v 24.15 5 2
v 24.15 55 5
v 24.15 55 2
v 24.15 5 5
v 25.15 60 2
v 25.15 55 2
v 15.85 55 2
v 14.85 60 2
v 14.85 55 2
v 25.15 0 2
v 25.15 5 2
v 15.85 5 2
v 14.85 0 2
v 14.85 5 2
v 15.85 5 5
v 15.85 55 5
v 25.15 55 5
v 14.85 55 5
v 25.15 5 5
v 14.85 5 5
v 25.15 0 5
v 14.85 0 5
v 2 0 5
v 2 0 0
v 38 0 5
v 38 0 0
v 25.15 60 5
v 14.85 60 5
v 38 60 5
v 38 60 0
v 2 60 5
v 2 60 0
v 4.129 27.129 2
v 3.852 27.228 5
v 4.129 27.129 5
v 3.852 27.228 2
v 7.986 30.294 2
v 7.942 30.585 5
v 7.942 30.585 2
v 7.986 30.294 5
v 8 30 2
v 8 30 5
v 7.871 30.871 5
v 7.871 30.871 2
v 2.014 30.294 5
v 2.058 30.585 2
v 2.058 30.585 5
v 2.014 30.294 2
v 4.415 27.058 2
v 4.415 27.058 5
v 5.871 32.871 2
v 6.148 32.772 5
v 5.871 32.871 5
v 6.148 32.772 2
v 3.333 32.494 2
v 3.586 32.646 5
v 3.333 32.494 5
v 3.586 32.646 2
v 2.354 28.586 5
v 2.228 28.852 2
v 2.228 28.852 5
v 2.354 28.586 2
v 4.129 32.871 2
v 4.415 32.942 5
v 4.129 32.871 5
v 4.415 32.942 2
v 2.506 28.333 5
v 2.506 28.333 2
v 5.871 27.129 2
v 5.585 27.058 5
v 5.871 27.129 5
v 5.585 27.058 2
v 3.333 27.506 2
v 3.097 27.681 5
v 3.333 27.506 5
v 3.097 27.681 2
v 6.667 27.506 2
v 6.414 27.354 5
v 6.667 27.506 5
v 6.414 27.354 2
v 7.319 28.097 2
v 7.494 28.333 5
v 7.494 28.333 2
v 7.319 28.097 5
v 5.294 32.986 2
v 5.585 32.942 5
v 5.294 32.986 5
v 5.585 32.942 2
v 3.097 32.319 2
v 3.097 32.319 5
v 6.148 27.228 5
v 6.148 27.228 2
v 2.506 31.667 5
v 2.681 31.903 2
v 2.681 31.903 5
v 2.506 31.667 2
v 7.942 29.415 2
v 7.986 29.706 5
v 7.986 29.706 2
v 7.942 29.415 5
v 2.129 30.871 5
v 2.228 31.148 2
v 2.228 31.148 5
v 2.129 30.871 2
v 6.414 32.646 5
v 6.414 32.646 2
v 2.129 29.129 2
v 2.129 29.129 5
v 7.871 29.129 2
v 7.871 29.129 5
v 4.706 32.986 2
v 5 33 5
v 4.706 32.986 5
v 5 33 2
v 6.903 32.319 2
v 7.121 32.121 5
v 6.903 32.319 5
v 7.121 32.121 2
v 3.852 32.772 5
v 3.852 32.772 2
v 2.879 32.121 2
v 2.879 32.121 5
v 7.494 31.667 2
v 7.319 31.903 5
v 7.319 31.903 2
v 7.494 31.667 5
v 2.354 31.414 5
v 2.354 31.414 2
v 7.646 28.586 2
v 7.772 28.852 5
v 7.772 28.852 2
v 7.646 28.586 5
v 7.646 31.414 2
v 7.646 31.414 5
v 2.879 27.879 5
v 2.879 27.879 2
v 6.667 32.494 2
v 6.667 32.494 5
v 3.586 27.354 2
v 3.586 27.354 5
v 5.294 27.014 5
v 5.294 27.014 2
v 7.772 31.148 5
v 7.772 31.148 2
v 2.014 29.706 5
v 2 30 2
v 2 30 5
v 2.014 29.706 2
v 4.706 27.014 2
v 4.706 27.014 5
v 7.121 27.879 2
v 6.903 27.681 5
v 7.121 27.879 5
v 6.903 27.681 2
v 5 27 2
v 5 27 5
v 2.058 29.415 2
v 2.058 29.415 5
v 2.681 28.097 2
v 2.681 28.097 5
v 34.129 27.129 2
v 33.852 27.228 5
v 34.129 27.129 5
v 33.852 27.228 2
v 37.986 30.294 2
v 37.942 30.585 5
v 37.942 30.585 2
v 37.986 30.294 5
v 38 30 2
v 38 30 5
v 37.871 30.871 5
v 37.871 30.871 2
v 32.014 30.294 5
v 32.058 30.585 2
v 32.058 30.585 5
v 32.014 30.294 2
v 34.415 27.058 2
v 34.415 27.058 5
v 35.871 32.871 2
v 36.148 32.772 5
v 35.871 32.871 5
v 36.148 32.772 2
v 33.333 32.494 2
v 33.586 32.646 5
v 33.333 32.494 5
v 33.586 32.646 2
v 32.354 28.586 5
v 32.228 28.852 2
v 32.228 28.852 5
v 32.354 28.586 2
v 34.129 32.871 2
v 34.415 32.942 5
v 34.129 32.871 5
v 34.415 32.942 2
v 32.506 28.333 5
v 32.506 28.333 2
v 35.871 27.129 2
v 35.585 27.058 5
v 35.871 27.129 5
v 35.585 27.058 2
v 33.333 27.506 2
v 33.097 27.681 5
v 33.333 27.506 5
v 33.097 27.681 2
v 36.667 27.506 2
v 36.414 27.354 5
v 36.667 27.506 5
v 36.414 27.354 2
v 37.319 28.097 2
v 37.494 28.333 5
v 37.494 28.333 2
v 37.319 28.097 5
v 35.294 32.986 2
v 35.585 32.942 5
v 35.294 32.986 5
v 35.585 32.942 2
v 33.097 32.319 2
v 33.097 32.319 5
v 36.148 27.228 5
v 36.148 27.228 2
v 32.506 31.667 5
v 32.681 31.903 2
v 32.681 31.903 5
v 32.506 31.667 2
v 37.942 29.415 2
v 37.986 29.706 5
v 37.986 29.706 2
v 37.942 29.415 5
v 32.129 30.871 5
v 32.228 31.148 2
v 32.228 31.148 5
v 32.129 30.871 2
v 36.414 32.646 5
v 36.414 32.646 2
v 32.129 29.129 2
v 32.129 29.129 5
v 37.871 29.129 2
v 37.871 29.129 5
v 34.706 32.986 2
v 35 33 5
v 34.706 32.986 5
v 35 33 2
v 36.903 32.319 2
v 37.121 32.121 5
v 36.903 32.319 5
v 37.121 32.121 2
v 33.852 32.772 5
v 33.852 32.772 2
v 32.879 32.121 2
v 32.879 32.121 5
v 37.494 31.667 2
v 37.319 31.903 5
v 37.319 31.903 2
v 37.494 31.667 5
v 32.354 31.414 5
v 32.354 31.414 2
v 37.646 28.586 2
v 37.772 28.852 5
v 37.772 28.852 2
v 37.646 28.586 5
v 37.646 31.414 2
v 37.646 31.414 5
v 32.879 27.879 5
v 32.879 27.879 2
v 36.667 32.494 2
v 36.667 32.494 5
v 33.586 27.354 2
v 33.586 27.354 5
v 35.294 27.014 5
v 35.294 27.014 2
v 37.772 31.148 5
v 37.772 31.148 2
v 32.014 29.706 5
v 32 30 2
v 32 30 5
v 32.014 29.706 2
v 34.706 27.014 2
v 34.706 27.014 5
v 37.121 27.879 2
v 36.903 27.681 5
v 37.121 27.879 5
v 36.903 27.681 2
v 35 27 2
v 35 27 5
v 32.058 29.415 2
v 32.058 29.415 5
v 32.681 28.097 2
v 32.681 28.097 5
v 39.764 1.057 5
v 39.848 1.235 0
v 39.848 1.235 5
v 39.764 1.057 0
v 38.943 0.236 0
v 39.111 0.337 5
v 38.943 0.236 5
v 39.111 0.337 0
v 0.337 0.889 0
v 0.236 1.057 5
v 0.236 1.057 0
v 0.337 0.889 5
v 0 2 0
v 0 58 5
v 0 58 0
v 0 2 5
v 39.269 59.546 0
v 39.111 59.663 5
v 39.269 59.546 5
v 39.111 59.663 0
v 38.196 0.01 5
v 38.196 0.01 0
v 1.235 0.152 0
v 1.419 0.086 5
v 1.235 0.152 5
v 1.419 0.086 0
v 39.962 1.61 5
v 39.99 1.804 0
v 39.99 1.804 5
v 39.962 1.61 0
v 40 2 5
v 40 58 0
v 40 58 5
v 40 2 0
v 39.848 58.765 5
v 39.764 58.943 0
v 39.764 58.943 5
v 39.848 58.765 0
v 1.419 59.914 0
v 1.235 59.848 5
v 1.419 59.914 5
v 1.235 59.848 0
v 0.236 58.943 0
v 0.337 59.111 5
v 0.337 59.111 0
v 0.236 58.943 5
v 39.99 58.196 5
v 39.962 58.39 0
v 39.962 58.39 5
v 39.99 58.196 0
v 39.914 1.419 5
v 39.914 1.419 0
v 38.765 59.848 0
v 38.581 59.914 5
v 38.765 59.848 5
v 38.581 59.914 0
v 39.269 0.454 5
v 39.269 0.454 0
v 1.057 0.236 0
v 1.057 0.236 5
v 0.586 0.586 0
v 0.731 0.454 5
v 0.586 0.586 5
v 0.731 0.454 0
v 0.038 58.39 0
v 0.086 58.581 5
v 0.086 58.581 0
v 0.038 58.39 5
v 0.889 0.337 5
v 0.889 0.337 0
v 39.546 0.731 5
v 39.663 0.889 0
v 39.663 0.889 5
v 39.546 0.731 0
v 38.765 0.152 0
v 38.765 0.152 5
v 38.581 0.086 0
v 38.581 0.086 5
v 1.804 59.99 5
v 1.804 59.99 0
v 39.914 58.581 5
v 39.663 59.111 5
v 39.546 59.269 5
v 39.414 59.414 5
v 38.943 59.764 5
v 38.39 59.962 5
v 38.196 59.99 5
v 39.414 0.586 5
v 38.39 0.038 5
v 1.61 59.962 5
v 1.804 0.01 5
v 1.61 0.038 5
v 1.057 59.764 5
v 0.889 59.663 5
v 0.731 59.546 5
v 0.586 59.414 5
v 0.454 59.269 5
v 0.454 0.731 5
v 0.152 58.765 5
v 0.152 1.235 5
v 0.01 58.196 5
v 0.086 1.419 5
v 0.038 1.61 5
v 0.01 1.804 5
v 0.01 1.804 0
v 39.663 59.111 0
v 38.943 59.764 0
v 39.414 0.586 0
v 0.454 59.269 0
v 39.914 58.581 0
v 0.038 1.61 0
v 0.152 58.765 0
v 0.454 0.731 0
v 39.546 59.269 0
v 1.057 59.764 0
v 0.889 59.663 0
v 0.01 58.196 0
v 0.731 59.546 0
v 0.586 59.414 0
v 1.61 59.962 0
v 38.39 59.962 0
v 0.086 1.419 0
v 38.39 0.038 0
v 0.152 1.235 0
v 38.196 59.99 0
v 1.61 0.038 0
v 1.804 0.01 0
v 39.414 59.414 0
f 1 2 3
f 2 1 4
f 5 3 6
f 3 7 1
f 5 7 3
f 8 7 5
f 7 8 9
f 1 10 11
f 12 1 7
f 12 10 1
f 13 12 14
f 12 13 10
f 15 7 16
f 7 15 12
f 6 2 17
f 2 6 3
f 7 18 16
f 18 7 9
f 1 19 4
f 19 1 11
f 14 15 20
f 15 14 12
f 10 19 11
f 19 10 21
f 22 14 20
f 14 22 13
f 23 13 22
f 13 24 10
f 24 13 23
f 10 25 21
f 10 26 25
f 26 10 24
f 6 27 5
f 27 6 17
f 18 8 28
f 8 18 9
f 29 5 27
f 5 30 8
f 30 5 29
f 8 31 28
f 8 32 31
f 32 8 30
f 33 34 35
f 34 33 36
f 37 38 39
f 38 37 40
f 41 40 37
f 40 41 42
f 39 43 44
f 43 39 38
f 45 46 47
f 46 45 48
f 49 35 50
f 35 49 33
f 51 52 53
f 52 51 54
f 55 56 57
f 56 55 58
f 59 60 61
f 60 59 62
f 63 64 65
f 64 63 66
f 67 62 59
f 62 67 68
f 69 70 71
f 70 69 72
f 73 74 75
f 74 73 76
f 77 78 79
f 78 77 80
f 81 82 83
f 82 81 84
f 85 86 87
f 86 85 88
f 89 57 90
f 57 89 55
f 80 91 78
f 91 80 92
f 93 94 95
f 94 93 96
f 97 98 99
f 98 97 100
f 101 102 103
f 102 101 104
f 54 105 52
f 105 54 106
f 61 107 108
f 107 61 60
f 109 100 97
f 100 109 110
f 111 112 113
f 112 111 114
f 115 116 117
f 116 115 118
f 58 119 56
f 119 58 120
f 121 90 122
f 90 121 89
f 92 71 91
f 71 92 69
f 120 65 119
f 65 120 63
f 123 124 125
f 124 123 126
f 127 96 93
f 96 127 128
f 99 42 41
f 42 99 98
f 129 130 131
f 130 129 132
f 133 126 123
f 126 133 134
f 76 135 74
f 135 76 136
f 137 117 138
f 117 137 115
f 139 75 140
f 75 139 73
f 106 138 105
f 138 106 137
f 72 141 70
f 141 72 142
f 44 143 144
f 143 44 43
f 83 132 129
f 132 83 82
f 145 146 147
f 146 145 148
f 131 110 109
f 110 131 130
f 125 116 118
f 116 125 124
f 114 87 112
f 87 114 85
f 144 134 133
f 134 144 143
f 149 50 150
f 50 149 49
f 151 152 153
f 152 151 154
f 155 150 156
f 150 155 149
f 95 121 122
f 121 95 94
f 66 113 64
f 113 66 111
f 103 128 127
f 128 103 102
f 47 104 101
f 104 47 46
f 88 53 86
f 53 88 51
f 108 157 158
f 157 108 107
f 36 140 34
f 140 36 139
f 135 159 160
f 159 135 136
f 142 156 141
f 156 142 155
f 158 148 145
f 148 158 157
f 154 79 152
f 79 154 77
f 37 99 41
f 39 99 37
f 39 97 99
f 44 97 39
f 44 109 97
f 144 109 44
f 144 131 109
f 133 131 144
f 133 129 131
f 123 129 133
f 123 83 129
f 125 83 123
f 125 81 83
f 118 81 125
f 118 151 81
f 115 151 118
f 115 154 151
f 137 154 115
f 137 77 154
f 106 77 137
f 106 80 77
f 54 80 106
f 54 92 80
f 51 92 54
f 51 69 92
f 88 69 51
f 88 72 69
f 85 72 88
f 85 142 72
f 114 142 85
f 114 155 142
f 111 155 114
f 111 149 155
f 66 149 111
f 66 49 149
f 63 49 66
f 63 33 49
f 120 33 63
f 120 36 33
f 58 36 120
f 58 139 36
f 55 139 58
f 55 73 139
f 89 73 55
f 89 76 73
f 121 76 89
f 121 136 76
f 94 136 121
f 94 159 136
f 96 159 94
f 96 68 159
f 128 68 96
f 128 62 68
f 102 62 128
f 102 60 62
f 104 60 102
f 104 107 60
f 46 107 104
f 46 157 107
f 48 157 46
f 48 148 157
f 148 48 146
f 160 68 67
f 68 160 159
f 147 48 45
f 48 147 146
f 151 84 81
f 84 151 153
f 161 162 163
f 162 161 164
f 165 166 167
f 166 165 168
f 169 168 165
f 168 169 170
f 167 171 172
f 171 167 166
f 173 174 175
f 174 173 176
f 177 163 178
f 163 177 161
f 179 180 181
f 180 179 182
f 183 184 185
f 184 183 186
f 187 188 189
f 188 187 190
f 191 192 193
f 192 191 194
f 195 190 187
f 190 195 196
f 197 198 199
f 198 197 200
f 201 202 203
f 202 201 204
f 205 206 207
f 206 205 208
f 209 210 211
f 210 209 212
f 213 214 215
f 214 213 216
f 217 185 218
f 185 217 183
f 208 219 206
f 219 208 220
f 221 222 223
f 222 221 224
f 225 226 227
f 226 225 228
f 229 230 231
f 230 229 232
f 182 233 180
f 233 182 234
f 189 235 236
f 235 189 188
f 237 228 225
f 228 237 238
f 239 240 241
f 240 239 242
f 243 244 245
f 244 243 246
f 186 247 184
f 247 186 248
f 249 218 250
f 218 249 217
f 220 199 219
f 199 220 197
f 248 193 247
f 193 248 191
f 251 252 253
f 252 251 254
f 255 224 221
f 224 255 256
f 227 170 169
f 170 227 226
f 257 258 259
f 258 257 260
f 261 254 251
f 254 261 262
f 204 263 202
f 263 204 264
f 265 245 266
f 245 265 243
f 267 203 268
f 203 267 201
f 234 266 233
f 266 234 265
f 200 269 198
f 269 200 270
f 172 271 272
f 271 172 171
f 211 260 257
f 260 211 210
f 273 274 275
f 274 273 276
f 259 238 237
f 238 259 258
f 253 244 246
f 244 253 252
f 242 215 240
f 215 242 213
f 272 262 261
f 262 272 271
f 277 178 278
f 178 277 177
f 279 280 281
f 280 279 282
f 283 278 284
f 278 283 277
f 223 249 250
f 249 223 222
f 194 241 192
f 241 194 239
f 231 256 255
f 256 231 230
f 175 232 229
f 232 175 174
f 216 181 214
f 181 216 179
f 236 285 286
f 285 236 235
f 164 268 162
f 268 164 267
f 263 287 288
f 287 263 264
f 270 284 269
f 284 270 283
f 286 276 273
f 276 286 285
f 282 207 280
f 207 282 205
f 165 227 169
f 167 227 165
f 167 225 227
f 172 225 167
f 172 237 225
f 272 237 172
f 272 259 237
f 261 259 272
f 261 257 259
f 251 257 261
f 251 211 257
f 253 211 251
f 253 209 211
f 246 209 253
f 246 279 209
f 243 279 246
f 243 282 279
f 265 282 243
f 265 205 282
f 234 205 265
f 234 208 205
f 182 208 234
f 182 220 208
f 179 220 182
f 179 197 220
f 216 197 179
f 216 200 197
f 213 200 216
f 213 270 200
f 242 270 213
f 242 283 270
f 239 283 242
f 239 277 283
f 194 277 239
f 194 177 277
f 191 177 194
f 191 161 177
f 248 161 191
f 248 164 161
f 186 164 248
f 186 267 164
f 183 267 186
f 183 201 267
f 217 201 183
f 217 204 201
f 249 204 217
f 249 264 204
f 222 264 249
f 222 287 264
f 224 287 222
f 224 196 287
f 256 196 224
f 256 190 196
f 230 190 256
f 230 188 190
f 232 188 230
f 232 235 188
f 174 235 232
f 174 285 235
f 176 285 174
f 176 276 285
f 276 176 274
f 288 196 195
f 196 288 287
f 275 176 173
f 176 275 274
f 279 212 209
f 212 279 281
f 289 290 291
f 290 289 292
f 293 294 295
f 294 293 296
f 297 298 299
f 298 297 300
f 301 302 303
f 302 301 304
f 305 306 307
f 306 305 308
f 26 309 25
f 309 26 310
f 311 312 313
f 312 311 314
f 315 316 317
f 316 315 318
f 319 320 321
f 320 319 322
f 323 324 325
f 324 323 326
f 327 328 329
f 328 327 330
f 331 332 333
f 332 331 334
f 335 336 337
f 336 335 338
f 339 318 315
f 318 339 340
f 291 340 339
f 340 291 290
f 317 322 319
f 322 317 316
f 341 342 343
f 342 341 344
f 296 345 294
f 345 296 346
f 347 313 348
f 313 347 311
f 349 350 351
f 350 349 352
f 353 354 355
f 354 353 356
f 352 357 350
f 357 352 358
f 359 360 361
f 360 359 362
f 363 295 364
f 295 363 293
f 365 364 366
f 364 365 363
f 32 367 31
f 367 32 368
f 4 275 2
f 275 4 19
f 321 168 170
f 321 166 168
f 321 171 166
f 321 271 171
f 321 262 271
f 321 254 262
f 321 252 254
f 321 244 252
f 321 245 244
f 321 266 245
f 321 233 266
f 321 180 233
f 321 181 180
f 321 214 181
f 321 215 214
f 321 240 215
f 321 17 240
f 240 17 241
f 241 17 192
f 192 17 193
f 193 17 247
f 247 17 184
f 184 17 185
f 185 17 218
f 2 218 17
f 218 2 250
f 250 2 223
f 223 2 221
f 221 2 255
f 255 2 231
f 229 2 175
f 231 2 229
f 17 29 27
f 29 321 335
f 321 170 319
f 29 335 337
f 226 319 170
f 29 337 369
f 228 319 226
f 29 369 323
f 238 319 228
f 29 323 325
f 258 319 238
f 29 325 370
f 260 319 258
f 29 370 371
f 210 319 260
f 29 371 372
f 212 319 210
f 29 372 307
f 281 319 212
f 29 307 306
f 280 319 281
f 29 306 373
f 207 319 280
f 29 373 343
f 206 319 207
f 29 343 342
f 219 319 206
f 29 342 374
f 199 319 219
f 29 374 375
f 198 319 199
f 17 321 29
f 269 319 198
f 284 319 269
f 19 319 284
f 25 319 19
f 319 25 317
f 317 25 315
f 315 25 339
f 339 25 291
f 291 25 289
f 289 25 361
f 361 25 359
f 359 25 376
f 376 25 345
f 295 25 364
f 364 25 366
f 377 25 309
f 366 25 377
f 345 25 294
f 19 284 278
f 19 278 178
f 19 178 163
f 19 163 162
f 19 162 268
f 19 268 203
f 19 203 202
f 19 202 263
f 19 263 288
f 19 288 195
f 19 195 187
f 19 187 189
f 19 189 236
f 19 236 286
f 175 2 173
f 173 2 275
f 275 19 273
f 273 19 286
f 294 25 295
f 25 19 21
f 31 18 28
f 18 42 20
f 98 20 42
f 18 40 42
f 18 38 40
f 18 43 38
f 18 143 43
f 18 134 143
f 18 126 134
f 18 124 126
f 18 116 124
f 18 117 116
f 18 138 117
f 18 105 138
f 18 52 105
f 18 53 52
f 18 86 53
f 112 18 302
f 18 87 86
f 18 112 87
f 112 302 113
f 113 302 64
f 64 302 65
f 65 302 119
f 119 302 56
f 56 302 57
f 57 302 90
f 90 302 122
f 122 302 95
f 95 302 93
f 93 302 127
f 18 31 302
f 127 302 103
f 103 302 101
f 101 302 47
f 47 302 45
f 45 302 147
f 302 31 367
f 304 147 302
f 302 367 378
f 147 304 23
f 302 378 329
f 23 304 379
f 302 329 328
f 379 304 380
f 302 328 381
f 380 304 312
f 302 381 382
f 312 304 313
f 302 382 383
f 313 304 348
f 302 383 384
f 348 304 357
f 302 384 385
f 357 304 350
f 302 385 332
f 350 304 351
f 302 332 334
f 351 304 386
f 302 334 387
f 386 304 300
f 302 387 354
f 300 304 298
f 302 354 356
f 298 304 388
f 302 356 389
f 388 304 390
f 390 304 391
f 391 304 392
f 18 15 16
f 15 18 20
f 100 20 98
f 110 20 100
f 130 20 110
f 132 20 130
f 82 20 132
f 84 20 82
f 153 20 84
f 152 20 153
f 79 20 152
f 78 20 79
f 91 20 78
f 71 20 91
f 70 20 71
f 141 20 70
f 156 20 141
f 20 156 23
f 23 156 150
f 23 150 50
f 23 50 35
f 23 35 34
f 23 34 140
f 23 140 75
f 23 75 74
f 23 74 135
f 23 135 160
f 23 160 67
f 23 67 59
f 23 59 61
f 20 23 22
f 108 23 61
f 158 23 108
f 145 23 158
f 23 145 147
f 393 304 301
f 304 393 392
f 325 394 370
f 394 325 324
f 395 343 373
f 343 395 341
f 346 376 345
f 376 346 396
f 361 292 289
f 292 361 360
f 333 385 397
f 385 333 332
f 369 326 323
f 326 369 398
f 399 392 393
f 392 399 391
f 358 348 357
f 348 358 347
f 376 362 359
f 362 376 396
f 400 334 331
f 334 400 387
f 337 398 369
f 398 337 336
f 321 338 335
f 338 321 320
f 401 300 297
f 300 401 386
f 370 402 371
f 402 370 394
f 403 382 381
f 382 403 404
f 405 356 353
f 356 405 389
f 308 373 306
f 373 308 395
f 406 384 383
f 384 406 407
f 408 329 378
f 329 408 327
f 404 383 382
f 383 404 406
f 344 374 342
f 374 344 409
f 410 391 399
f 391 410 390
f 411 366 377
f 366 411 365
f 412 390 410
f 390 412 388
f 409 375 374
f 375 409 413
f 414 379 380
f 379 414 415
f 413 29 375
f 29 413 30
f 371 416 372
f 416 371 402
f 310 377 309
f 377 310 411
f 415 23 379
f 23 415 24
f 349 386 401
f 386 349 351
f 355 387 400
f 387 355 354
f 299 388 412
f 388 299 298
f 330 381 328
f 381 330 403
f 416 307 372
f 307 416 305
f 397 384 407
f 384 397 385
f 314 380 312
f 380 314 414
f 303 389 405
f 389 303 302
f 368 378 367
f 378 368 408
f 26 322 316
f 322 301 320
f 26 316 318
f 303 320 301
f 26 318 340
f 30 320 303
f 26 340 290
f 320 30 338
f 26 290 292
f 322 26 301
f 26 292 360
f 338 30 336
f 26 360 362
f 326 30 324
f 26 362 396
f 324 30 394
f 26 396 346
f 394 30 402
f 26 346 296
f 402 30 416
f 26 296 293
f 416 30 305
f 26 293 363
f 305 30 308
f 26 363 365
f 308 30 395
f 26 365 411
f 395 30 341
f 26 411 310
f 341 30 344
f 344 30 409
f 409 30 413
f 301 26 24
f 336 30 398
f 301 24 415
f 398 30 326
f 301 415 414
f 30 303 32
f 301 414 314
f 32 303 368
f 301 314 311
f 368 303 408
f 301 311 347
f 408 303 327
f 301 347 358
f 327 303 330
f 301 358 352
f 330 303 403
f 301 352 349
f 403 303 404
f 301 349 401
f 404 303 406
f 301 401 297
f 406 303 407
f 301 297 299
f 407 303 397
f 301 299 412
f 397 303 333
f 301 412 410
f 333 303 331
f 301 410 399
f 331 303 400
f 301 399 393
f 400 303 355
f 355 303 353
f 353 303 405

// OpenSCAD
// file: ../src/strip_feeder_magnetic.scad
// Strip Feeder with Magnetic Holders for MicroSMT v3
// Based on the MicroSMT v3 magnetic slot design
// Supports 8mm, 12mm, 16mm, and 24mm tape widths

/* [Main Parameters] */
// Tape width in mm (8, 12, 16, or 24)
tape_width = 8; // [8:4:24]

// Number of feeder slots
num_slots = 1; // [1:1:10]

// Render mode
render_mode = "single"; // [single:Single Slot, array:Array of Slots, base:Base Only]

/* [Dimensions] */
// Base dimensions
base_length = 60;
base_width = 40;
base_height = 5;

// Slot dimensions (adjusted based on tape width)
slot_length = 50;
slot_depth = 3;

// Magnetic holder mounting
magnet_diameter = 6;
magnet_depth = 3;
magnet_spacing = 30; // Distance between magnet centers

// Wall thickness
wall_thickness = 2;

/* [Advanced Settings] */
// Tolerance for tape fit
tape_tolerance = 0.3;

// Corner radius for rounded edges
corner_radius = 2;

// Show magnets (for visualization)
show_magnets = false;

/* [Hidden] */
$fn = 64;

// Calculate slot width based on tape width with tolerance
slot_width = tape_width + tape_tolerance;

module rounded_cube(size, radius) {
    hull() {
        translate([radius, radius, 0])
            cylinder(r=radius, h=size[2]);
        translate([size[0]-radius, radius, 0])
            cylinder(r=radius, h=size[2]);
        translate([radius, size[1]-radius, 0])
            cylinder(r=radius, h=size[2]);
        translate([size[0]-radius, size[1]-radius, 0])
            cylinder(r=radius, h=size[2]);
    }
}

module magnet_hole() {
    cylinder(d=magnet_diameter, h=magnet_depth + 0.1);
}

module magnet_holes_array() {
    // Two magnets along the X-axis for stable mounting
    // Left magnet (negative X direction)
    translate([base_width/2 - magnet_spacing/2, base_length/2, base_height - magnet_depth])
        magnet_hole();
    // Right magnet (positive X direction)
    translate([base_width/2 + magnet_spacing/2, base_length/2, base_height - magnet_depth])
        magnet_hole();
}

module tape_channel() {
    // Main tape channel
    translate([base_width/2 - slot_width/2, (base_length - slot_length)/2, base_height - slot_depth])
        cube([slot_width, slot_length, slot_depth + 0.1]);
    
    // Entry and exit chamfers
    translate([base_width/2 - slot_width/2 - 1, (base_length - slot_length)/2 - 5, base_height - slot_depth])
        cube([slot_width + 2, 5, slot_depth + 0.1]);
    translate([base_width/2 - slot_width/2 - 1, (base_length - slot_length)/2 + slot_length, base_height - slot_depth])
        cube([slot_width + 2, 5, slot_depth + 0.1]);
}

module single_feeder_slot() {
    difference() {
        // Main base
        rounded_cube([base_width, base_length, base_height], corner_radius);
        
        // Tape channel
        tape_channel();
        
        // Magnet holes
        magnet_holes_array();
    }
    
    // Visual magnets (for reference)
    if (show_magnets) {
        color("silver", 0.8) {
            translate([base_width/2 - magnet_spacing/2, base_length/2, base_height - magnet_depth])
                cylinder(d=magnet_diameter, h=magnet_depth);
            translate([base_width/2 + magnet_spacing/2, base_length/2, base_height - magnet_depth])
                cylinder(d=magnet_diameter, h=magnet_depth);
        }
    }
}

module feeder_array() {
    for (i = [0:num_slots-1]) {
        translate([i * (base_width + 2), 0, 0])
            single_feeder_slot();
    }
}

module base_plate() {
    // Base mounting plate for multiple feeders
    plate_width = num_slots * (base_width + 2) + 10;
    plate_length = base_length + 10;
    plate_height = 3;
    
    difference() {
        rounded_cube([plate_width, plate_length, plate_height], corner_radius);
        
        // Mounting holes at corners
        for (x = [10, plate_width - 10]) {
            for (y = [10, plate_length - 10]) {
                translate([x, y, -0.1])
                    cylinder(d=3.5, h=plate_height + 0.2);
            }
        }
    }
}

// Main render logic
if (render_mode == "single") {
    single_feeder_slot();
} else if (render_mode == "array") {
    feeder_array();
} else if (render_mode == "base") {
    base_plate();
}

// Information
echo(str("Strip Feeder Configuration:"));
echo(str("  Tape Width: ", tape_width, "mm"));
echo(str("  Slot Width: ", slot_width, "mm"));
echo(str("  Number of Slots: ", num_slots));
echo(str("  Magnet Diameter: ", magnet_diameter, "mm"));
echo(str("  Magnet Depth: ", magnet_depth, "mm"));
// main file
// Example: Complete Feeder Set
// Mix of different tape widths for a typical production setup

// This file demonstrates how to create multiple feeders at once
// Uncomment the configuration you want to render

// Option 1: Single 8mm feeder
//tape_width = 8;
//num_slots = 1;
//render_mode = "single";

// Option 2: Array of 4x 8mm feeders (most common size)
tape_width = 8;
num_slots = 4;
render_mode = "array";

// Option 3: Base mounting plate for multiple feeders
//num_slots = 6;
//render_mode = "base";

include <../src/strip_feeder_magnetic.scad>

// To render multiple sizes, export each separately:
// 1. Set parameters for first size
// 2. Render (F6) and export STL
// 3. Change parameters for next size
// 4. Repeat
